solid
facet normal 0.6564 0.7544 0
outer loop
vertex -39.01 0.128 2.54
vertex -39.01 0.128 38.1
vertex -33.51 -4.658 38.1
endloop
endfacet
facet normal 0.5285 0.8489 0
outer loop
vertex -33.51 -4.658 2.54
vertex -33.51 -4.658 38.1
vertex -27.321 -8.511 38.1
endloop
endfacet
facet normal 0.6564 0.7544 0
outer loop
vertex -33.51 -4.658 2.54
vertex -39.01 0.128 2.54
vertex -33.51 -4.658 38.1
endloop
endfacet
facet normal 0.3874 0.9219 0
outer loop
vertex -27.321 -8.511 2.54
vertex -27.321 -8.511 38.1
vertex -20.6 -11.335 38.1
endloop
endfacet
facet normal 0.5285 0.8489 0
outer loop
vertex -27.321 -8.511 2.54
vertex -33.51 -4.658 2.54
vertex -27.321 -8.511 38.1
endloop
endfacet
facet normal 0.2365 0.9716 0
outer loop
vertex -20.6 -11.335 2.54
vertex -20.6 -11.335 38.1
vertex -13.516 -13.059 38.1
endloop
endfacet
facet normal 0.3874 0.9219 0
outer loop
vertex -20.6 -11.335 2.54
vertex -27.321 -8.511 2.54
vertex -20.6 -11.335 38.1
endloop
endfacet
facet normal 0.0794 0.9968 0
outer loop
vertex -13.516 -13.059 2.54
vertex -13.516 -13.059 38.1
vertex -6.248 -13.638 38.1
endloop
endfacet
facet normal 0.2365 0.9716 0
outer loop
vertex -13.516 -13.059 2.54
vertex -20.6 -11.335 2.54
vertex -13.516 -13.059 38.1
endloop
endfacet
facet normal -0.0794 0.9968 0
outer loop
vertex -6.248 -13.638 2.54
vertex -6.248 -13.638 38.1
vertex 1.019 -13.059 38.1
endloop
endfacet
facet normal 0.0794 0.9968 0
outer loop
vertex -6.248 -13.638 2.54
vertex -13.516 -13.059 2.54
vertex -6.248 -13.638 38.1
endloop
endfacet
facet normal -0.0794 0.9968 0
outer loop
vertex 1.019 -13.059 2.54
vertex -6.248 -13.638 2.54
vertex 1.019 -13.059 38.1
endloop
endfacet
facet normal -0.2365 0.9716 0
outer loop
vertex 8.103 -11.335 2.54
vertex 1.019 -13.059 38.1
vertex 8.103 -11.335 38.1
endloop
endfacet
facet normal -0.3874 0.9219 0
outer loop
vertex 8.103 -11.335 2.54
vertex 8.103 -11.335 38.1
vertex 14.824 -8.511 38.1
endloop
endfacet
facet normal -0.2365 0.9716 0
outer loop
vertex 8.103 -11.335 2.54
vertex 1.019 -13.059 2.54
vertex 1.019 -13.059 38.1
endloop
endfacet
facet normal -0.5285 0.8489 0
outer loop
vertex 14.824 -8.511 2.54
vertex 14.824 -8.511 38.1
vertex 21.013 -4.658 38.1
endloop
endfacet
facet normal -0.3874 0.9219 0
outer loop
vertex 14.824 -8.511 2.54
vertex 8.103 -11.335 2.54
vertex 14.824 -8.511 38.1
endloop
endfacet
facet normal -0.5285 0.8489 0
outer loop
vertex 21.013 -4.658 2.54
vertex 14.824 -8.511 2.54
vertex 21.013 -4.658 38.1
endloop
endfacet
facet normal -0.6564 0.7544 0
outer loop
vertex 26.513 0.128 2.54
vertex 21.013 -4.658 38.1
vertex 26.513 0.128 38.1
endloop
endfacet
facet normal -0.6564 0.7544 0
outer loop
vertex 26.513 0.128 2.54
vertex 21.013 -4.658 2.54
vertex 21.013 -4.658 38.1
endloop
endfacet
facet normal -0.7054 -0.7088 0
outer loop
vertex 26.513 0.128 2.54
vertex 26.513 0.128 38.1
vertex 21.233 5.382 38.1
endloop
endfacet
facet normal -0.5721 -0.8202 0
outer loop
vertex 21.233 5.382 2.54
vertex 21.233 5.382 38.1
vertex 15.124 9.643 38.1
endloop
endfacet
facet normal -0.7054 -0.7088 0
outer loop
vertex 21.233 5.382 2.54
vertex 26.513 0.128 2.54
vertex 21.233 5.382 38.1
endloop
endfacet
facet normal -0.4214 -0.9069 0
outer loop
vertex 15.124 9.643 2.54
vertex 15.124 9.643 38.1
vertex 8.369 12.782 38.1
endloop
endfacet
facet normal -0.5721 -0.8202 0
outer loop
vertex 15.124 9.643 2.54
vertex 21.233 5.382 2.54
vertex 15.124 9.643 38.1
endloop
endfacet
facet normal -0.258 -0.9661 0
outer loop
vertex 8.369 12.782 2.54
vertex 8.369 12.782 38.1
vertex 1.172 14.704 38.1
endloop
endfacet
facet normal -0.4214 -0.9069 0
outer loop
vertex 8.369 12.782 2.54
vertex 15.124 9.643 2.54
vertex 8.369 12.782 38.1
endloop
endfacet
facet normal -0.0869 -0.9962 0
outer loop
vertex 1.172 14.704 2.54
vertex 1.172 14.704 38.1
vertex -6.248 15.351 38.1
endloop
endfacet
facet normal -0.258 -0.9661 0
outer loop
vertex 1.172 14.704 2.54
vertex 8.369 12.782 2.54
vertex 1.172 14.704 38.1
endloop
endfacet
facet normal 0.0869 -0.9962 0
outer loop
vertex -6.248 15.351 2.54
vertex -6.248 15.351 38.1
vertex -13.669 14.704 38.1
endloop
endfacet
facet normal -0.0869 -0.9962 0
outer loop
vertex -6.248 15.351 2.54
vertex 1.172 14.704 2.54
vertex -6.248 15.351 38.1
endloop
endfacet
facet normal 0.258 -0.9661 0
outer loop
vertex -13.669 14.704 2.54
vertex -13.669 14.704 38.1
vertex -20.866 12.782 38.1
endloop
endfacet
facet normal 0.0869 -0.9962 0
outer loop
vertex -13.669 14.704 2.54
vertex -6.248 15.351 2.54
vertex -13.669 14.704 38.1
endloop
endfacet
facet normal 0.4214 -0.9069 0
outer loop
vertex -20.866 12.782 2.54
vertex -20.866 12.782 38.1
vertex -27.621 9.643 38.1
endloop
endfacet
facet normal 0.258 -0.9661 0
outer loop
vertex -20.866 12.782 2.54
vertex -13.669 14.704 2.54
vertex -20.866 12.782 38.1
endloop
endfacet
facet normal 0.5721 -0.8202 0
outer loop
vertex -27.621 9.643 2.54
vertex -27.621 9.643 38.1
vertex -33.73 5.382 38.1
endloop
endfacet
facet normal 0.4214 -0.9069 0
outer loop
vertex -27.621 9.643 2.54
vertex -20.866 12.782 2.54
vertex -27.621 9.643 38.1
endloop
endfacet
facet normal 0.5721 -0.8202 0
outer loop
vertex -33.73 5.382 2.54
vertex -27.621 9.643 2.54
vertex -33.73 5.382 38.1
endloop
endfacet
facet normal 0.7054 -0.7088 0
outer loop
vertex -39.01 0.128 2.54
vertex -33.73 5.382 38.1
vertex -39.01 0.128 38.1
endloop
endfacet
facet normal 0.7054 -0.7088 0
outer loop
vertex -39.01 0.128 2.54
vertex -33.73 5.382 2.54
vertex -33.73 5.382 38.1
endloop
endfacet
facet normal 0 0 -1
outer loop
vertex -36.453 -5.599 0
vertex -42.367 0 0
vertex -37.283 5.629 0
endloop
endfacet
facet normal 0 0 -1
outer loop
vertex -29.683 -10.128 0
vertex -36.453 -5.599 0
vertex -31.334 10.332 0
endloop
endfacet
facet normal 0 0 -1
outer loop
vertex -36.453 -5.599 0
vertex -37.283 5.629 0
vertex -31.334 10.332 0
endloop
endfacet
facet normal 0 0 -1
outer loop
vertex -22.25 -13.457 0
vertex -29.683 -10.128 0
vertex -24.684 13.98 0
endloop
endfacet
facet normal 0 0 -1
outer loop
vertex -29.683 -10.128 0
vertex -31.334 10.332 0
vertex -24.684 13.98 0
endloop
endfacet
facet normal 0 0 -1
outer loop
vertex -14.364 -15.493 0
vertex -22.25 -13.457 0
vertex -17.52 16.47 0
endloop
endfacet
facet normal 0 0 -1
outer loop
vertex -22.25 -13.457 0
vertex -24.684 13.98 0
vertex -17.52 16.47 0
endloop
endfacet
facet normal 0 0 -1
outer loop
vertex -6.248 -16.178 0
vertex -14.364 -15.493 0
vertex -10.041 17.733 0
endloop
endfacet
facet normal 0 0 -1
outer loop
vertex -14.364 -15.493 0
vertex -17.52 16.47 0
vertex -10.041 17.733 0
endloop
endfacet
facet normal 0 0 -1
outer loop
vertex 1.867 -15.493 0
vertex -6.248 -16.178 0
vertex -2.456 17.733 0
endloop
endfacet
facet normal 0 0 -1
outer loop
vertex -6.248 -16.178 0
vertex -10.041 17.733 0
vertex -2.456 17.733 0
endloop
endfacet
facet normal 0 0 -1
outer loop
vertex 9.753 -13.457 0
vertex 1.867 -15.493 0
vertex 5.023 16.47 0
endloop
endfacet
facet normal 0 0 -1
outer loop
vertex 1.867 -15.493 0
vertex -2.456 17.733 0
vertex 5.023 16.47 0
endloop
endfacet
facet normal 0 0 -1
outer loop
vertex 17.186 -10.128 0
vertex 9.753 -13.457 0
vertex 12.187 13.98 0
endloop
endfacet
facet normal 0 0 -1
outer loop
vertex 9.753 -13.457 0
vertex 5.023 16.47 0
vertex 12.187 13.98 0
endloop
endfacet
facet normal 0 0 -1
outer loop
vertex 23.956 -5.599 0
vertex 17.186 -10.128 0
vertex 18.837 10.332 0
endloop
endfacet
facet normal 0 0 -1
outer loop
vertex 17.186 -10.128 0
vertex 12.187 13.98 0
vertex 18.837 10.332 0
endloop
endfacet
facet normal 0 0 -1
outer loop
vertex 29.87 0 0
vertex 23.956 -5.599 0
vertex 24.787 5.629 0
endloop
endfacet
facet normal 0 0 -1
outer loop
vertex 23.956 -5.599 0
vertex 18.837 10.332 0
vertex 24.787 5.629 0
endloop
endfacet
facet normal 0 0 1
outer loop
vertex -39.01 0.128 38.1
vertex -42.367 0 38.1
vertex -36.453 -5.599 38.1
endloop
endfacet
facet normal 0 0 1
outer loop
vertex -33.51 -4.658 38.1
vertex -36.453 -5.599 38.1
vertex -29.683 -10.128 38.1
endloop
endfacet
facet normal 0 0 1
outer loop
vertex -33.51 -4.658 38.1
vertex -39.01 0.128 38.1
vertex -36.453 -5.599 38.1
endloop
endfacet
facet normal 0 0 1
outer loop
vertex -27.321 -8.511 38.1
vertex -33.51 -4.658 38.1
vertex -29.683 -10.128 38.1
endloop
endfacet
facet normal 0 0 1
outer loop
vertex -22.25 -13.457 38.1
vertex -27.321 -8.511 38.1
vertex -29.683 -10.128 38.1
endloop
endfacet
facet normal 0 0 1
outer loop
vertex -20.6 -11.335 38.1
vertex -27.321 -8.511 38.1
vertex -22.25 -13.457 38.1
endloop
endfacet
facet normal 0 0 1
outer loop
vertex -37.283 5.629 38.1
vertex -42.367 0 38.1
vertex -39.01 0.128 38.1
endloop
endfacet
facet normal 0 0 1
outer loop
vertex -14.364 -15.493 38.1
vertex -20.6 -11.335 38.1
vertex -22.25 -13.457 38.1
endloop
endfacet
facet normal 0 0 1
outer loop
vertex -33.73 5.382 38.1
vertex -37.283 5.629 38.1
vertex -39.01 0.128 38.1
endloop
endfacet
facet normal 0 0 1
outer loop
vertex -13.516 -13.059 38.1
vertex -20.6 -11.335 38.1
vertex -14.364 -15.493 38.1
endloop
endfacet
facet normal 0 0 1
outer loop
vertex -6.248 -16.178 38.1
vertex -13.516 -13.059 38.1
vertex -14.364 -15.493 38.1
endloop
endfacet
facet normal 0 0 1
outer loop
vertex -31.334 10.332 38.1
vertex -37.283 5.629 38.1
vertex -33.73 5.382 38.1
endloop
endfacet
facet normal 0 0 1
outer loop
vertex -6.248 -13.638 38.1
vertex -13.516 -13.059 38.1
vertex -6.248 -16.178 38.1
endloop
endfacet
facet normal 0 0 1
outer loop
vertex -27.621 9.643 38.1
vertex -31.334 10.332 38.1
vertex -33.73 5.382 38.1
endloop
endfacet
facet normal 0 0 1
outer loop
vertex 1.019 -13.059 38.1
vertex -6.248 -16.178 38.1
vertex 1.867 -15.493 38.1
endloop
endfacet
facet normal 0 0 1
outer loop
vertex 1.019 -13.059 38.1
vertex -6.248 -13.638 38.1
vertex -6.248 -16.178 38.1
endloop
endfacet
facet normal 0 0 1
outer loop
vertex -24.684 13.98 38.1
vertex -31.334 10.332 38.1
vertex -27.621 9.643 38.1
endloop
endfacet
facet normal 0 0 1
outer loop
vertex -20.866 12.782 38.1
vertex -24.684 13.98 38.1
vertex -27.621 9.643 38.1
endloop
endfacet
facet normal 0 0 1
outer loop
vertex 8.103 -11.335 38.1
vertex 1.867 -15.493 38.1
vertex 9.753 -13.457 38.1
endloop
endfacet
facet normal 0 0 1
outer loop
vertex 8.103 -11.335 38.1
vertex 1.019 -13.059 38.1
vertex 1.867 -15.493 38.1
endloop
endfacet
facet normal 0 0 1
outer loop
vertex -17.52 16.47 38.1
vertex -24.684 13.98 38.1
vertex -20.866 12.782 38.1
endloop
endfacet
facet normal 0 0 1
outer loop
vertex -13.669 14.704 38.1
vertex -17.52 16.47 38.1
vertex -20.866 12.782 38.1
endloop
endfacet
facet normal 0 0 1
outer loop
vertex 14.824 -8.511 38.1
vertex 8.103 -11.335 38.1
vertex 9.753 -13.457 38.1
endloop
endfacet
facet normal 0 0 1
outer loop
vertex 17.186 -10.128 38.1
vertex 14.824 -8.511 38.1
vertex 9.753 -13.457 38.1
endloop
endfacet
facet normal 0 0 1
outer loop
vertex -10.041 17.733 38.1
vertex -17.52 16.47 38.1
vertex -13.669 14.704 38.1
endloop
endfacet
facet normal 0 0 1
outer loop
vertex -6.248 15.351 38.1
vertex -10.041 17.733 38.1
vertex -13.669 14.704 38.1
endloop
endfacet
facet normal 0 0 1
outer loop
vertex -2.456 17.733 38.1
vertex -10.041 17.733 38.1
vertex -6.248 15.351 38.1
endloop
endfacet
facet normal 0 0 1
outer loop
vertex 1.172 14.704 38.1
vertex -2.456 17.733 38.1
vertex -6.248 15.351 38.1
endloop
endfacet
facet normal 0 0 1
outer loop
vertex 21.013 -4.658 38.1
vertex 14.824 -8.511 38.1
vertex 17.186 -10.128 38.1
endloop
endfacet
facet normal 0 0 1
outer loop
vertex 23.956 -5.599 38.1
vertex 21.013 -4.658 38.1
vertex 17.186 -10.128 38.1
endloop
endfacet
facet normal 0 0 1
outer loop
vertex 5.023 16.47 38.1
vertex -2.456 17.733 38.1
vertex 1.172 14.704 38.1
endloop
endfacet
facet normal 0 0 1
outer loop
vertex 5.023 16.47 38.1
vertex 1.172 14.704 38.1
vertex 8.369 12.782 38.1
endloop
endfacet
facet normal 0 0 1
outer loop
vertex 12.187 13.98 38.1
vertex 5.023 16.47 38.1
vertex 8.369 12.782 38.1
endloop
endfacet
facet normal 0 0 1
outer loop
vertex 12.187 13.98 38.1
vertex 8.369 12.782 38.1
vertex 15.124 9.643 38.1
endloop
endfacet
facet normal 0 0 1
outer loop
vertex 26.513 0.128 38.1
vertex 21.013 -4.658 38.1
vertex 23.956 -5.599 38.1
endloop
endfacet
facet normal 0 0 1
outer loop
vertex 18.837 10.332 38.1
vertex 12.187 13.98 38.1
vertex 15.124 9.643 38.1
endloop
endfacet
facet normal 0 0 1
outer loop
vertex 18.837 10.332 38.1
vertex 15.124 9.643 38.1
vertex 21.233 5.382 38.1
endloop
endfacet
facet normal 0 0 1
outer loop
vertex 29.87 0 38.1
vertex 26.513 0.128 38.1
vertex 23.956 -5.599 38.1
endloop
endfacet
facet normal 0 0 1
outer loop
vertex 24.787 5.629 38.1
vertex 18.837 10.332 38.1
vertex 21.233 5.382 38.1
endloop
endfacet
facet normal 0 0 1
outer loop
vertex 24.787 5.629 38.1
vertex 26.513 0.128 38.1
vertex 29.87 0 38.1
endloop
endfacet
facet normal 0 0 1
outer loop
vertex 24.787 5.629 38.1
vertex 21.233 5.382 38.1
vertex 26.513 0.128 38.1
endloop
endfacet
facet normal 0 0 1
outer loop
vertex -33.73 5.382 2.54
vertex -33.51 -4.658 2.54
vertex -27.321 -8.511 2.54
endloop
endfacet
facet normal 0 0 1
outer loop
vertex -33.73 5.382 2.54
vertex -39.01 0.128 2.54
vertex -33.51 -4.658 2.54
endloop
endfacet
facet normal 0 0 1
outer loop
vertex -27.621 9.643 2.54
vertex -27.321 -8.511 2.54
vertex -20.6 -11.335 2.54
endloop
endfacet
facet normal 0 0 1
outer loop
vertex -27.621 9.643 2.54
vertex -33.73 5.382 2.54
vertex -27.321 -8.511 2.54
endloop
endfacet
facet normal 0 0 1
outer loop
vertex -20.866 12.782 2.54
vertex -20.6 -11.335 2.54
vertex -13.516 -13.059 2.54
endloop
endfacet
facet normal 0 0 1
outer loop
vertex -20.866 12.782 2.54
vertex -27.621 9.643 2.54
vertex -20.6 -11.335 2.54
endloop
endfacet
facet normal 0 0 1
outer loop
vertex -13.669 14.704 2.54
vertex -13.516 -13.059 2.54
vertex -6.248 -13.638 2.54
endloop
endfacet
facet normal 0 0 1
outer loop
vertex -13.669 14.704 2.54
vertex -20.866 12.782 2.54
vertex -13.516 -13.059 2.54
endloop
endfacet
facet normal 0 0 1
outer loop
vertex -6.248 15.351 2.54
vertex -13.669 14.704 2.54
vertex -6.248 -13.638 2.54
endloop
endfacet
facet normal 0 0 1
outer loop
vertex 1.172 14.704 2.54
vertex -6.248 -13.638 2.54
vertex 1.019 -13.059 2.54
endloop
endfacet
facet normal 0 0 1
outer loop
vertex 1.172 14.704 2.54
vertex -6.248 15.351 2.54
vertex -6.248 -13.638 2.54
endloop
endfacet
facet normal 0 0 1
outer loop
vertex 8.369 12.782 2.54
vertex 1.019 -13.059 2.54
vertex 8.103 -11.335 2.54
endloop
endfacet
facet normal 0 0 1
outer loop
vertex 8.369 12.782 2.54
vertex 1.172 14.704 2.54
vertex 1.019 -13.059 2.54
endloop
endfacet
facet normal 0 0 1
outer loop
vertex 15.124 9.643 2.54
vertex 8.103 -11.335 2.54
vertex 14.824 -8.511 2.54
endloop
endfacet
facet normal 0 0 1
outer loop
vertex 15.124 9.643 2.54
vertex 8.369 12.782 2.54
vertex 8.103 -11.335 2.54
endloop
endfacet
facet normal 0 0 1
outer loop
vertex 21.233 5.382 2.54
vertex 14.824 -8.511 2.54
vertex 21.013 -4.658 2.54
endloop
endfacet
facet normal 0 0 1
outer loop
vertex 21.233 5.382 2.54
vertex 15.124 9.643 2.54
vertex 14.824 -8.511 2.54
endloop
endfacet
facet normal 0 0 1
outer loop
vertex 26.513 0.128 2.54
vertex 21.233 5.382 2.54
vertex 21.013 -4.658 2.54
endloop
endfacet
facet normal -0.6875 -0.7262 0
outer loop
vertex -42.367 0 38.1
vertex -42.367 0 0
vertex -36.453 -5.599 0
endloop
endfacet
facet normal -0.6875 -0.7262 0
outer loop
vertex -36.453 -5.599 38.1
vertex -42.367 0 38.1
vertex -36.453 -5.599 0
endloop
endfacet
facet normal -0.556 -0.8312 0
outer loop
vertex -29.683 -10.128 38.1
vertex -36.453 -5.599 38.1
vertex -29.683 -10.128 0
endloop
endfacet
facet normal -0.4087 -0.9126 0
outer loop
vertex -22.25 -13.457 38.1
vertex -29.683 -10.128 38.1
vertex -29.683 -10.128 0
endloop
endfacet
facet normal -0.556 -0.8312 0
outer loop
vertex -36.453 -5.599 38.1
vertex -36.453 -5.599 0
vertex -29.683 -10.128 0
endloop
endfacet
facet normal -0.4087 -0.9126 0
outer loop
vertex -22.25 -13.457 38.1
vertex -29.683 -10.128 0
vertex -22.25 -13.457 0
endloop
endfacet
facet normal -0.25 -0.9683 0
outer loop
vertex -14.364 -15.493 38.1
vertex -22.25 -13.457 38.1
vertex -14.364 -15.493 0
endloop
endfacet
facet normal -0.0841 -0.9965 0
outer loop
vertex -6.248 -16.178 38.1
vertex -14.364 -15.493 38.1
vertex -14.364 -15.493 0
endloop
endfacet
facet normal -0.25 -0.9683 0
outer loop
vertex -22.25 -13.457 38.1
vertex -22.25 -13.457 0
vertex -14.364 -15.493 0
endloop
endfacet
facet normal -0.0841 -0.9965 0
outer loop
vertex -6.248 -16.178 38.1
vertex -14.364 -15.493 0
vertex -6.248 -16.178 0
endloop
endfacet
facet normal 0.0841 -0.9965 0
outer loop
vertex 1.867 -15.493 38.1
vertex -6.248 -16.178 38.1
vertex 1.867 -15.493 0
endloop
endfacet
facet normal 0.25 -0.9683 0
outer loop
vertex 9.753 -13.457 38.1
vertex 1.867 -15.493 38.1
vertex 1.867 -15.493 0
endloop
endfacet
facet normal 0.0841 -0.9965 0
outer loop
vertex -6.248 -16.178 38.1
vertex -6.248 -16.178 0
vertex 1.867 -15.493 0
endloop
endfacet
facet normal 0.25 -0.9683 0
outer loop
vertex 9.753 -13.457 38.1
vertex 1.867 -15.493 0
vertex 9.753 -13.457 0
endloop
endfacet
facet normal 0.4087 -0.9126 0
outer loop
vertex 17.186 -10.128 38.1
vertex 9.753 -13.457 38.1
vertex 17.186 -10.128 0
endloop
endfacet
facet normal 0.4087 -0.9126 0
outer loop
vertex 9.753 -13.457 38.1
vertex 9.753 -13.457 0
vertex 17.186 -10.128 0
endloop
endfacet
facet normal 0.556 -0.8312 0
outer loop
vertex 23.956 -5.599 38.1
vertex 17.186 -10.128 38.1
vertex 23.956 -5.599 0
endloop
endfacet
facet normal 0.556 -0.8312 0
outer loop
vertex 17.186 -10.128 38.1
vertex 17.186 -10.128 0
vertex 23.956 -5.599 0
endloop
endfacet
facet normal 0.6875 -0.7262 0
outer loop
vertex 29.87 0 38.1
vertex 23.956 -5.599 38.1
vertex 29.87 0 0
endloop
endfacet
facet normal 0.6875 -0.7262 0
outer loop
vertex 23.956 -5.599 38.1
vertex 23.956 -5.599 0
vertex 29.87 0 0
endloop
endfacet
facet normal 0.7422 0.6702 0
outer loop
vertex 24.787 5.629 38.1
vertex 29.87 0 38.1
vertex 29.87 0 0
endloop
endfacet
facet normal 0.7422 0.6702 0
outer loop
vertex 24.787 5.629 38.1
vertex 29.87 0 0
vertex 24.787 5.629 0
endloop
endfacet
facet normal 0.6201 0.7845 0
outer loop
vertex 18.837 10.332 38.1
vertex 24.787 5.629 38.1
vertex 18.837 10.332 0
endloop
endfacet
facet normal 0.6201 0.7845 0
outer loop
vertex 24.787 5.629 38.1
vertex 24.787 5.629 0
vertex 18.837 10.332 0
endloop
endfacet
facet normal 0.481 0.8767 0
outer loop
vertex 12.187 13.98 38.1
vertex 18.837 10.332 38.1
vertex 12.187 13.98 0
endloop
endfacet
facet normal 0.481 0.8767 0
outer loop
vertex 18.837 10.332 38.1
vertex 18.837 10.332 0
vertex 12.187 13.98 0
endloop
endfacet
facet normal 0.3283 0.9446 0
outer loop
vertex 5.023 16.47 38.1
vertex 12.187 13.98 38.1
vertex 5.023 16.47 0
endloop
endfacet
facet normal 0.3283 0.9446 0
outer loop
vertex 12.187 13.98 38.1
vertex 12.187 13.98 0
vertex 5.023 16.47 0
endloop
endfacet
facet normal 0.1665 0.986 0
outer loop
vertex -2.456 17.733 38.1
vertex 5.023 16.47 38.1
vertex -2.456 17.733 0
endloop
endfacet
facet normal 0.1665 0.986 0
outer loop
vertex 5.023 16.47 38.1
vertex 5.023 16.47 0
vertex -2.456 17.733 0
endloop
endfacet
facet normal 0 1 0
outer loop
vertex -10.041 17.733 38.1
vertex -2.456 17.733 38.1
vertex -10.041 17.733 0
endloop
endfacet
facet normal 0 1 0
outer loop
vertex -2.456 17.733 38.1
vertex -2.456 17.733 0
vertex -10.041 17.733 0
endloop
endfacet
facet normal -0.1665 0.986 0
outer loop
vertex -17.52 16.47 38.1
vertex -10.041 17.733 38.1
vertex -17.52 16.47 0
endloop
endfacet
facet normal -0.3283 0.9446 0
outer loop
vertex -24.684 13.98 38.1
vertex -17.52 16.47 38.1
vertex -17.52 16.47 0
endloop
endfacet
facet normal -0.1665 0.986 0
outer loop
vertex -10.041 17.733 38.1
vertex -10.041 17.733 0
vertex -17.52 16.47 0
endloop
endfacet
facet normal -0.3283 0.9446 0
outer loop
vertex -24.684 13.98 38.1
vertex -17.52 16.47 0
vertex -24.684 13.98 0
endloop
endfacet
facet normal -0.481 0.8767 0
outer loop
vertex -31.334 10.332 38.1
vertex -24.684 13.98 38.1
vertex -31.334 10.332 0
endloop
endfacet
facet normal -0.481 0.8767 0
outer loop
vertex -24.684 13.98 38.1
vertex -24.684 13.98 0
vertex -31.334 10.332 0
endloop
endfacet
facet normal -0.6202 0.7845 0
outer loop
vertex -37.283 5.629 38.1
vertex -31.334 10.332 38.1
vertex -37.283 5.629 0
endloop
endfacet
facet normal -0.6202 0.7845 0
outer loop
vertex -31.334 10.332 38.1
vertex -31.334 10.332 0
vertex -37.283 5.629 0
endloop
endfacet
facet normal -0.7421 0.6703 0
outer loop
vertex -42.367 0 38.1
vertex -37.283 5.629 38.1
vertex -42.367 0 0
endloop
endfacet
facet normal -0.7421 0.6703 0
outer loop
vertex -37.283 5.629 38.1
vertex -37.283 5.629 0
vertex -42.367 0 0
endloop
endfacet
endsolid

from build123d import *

# Parameters (mm, degrees)
F1_DEPTH = 38.1
F2_T     = -2.54


with BuildPart() as f1:
    # F0 (on Top) → F1 (new body)
    with BuildSketch(Plane.XY):
        with BuildLine():
            ThreePointArc((-42.367201, 0), (-6.248401, -16.178203), (29.870398, 0))
            ThreePointArc((29.870398, 0), (-6.248401, 17.891403), (-42.367201, 0))
        make_face()
    extrude(amount=F1_DEPTH)

    # F2
    f2_openings = [f1.faces().sort_by_distance(p)[0] for p in [
        (-6.248401, 0.736182, 38.1),
    ]]
    offset(amount=F2_T, openings=f2_openings)


solid = f1.part
